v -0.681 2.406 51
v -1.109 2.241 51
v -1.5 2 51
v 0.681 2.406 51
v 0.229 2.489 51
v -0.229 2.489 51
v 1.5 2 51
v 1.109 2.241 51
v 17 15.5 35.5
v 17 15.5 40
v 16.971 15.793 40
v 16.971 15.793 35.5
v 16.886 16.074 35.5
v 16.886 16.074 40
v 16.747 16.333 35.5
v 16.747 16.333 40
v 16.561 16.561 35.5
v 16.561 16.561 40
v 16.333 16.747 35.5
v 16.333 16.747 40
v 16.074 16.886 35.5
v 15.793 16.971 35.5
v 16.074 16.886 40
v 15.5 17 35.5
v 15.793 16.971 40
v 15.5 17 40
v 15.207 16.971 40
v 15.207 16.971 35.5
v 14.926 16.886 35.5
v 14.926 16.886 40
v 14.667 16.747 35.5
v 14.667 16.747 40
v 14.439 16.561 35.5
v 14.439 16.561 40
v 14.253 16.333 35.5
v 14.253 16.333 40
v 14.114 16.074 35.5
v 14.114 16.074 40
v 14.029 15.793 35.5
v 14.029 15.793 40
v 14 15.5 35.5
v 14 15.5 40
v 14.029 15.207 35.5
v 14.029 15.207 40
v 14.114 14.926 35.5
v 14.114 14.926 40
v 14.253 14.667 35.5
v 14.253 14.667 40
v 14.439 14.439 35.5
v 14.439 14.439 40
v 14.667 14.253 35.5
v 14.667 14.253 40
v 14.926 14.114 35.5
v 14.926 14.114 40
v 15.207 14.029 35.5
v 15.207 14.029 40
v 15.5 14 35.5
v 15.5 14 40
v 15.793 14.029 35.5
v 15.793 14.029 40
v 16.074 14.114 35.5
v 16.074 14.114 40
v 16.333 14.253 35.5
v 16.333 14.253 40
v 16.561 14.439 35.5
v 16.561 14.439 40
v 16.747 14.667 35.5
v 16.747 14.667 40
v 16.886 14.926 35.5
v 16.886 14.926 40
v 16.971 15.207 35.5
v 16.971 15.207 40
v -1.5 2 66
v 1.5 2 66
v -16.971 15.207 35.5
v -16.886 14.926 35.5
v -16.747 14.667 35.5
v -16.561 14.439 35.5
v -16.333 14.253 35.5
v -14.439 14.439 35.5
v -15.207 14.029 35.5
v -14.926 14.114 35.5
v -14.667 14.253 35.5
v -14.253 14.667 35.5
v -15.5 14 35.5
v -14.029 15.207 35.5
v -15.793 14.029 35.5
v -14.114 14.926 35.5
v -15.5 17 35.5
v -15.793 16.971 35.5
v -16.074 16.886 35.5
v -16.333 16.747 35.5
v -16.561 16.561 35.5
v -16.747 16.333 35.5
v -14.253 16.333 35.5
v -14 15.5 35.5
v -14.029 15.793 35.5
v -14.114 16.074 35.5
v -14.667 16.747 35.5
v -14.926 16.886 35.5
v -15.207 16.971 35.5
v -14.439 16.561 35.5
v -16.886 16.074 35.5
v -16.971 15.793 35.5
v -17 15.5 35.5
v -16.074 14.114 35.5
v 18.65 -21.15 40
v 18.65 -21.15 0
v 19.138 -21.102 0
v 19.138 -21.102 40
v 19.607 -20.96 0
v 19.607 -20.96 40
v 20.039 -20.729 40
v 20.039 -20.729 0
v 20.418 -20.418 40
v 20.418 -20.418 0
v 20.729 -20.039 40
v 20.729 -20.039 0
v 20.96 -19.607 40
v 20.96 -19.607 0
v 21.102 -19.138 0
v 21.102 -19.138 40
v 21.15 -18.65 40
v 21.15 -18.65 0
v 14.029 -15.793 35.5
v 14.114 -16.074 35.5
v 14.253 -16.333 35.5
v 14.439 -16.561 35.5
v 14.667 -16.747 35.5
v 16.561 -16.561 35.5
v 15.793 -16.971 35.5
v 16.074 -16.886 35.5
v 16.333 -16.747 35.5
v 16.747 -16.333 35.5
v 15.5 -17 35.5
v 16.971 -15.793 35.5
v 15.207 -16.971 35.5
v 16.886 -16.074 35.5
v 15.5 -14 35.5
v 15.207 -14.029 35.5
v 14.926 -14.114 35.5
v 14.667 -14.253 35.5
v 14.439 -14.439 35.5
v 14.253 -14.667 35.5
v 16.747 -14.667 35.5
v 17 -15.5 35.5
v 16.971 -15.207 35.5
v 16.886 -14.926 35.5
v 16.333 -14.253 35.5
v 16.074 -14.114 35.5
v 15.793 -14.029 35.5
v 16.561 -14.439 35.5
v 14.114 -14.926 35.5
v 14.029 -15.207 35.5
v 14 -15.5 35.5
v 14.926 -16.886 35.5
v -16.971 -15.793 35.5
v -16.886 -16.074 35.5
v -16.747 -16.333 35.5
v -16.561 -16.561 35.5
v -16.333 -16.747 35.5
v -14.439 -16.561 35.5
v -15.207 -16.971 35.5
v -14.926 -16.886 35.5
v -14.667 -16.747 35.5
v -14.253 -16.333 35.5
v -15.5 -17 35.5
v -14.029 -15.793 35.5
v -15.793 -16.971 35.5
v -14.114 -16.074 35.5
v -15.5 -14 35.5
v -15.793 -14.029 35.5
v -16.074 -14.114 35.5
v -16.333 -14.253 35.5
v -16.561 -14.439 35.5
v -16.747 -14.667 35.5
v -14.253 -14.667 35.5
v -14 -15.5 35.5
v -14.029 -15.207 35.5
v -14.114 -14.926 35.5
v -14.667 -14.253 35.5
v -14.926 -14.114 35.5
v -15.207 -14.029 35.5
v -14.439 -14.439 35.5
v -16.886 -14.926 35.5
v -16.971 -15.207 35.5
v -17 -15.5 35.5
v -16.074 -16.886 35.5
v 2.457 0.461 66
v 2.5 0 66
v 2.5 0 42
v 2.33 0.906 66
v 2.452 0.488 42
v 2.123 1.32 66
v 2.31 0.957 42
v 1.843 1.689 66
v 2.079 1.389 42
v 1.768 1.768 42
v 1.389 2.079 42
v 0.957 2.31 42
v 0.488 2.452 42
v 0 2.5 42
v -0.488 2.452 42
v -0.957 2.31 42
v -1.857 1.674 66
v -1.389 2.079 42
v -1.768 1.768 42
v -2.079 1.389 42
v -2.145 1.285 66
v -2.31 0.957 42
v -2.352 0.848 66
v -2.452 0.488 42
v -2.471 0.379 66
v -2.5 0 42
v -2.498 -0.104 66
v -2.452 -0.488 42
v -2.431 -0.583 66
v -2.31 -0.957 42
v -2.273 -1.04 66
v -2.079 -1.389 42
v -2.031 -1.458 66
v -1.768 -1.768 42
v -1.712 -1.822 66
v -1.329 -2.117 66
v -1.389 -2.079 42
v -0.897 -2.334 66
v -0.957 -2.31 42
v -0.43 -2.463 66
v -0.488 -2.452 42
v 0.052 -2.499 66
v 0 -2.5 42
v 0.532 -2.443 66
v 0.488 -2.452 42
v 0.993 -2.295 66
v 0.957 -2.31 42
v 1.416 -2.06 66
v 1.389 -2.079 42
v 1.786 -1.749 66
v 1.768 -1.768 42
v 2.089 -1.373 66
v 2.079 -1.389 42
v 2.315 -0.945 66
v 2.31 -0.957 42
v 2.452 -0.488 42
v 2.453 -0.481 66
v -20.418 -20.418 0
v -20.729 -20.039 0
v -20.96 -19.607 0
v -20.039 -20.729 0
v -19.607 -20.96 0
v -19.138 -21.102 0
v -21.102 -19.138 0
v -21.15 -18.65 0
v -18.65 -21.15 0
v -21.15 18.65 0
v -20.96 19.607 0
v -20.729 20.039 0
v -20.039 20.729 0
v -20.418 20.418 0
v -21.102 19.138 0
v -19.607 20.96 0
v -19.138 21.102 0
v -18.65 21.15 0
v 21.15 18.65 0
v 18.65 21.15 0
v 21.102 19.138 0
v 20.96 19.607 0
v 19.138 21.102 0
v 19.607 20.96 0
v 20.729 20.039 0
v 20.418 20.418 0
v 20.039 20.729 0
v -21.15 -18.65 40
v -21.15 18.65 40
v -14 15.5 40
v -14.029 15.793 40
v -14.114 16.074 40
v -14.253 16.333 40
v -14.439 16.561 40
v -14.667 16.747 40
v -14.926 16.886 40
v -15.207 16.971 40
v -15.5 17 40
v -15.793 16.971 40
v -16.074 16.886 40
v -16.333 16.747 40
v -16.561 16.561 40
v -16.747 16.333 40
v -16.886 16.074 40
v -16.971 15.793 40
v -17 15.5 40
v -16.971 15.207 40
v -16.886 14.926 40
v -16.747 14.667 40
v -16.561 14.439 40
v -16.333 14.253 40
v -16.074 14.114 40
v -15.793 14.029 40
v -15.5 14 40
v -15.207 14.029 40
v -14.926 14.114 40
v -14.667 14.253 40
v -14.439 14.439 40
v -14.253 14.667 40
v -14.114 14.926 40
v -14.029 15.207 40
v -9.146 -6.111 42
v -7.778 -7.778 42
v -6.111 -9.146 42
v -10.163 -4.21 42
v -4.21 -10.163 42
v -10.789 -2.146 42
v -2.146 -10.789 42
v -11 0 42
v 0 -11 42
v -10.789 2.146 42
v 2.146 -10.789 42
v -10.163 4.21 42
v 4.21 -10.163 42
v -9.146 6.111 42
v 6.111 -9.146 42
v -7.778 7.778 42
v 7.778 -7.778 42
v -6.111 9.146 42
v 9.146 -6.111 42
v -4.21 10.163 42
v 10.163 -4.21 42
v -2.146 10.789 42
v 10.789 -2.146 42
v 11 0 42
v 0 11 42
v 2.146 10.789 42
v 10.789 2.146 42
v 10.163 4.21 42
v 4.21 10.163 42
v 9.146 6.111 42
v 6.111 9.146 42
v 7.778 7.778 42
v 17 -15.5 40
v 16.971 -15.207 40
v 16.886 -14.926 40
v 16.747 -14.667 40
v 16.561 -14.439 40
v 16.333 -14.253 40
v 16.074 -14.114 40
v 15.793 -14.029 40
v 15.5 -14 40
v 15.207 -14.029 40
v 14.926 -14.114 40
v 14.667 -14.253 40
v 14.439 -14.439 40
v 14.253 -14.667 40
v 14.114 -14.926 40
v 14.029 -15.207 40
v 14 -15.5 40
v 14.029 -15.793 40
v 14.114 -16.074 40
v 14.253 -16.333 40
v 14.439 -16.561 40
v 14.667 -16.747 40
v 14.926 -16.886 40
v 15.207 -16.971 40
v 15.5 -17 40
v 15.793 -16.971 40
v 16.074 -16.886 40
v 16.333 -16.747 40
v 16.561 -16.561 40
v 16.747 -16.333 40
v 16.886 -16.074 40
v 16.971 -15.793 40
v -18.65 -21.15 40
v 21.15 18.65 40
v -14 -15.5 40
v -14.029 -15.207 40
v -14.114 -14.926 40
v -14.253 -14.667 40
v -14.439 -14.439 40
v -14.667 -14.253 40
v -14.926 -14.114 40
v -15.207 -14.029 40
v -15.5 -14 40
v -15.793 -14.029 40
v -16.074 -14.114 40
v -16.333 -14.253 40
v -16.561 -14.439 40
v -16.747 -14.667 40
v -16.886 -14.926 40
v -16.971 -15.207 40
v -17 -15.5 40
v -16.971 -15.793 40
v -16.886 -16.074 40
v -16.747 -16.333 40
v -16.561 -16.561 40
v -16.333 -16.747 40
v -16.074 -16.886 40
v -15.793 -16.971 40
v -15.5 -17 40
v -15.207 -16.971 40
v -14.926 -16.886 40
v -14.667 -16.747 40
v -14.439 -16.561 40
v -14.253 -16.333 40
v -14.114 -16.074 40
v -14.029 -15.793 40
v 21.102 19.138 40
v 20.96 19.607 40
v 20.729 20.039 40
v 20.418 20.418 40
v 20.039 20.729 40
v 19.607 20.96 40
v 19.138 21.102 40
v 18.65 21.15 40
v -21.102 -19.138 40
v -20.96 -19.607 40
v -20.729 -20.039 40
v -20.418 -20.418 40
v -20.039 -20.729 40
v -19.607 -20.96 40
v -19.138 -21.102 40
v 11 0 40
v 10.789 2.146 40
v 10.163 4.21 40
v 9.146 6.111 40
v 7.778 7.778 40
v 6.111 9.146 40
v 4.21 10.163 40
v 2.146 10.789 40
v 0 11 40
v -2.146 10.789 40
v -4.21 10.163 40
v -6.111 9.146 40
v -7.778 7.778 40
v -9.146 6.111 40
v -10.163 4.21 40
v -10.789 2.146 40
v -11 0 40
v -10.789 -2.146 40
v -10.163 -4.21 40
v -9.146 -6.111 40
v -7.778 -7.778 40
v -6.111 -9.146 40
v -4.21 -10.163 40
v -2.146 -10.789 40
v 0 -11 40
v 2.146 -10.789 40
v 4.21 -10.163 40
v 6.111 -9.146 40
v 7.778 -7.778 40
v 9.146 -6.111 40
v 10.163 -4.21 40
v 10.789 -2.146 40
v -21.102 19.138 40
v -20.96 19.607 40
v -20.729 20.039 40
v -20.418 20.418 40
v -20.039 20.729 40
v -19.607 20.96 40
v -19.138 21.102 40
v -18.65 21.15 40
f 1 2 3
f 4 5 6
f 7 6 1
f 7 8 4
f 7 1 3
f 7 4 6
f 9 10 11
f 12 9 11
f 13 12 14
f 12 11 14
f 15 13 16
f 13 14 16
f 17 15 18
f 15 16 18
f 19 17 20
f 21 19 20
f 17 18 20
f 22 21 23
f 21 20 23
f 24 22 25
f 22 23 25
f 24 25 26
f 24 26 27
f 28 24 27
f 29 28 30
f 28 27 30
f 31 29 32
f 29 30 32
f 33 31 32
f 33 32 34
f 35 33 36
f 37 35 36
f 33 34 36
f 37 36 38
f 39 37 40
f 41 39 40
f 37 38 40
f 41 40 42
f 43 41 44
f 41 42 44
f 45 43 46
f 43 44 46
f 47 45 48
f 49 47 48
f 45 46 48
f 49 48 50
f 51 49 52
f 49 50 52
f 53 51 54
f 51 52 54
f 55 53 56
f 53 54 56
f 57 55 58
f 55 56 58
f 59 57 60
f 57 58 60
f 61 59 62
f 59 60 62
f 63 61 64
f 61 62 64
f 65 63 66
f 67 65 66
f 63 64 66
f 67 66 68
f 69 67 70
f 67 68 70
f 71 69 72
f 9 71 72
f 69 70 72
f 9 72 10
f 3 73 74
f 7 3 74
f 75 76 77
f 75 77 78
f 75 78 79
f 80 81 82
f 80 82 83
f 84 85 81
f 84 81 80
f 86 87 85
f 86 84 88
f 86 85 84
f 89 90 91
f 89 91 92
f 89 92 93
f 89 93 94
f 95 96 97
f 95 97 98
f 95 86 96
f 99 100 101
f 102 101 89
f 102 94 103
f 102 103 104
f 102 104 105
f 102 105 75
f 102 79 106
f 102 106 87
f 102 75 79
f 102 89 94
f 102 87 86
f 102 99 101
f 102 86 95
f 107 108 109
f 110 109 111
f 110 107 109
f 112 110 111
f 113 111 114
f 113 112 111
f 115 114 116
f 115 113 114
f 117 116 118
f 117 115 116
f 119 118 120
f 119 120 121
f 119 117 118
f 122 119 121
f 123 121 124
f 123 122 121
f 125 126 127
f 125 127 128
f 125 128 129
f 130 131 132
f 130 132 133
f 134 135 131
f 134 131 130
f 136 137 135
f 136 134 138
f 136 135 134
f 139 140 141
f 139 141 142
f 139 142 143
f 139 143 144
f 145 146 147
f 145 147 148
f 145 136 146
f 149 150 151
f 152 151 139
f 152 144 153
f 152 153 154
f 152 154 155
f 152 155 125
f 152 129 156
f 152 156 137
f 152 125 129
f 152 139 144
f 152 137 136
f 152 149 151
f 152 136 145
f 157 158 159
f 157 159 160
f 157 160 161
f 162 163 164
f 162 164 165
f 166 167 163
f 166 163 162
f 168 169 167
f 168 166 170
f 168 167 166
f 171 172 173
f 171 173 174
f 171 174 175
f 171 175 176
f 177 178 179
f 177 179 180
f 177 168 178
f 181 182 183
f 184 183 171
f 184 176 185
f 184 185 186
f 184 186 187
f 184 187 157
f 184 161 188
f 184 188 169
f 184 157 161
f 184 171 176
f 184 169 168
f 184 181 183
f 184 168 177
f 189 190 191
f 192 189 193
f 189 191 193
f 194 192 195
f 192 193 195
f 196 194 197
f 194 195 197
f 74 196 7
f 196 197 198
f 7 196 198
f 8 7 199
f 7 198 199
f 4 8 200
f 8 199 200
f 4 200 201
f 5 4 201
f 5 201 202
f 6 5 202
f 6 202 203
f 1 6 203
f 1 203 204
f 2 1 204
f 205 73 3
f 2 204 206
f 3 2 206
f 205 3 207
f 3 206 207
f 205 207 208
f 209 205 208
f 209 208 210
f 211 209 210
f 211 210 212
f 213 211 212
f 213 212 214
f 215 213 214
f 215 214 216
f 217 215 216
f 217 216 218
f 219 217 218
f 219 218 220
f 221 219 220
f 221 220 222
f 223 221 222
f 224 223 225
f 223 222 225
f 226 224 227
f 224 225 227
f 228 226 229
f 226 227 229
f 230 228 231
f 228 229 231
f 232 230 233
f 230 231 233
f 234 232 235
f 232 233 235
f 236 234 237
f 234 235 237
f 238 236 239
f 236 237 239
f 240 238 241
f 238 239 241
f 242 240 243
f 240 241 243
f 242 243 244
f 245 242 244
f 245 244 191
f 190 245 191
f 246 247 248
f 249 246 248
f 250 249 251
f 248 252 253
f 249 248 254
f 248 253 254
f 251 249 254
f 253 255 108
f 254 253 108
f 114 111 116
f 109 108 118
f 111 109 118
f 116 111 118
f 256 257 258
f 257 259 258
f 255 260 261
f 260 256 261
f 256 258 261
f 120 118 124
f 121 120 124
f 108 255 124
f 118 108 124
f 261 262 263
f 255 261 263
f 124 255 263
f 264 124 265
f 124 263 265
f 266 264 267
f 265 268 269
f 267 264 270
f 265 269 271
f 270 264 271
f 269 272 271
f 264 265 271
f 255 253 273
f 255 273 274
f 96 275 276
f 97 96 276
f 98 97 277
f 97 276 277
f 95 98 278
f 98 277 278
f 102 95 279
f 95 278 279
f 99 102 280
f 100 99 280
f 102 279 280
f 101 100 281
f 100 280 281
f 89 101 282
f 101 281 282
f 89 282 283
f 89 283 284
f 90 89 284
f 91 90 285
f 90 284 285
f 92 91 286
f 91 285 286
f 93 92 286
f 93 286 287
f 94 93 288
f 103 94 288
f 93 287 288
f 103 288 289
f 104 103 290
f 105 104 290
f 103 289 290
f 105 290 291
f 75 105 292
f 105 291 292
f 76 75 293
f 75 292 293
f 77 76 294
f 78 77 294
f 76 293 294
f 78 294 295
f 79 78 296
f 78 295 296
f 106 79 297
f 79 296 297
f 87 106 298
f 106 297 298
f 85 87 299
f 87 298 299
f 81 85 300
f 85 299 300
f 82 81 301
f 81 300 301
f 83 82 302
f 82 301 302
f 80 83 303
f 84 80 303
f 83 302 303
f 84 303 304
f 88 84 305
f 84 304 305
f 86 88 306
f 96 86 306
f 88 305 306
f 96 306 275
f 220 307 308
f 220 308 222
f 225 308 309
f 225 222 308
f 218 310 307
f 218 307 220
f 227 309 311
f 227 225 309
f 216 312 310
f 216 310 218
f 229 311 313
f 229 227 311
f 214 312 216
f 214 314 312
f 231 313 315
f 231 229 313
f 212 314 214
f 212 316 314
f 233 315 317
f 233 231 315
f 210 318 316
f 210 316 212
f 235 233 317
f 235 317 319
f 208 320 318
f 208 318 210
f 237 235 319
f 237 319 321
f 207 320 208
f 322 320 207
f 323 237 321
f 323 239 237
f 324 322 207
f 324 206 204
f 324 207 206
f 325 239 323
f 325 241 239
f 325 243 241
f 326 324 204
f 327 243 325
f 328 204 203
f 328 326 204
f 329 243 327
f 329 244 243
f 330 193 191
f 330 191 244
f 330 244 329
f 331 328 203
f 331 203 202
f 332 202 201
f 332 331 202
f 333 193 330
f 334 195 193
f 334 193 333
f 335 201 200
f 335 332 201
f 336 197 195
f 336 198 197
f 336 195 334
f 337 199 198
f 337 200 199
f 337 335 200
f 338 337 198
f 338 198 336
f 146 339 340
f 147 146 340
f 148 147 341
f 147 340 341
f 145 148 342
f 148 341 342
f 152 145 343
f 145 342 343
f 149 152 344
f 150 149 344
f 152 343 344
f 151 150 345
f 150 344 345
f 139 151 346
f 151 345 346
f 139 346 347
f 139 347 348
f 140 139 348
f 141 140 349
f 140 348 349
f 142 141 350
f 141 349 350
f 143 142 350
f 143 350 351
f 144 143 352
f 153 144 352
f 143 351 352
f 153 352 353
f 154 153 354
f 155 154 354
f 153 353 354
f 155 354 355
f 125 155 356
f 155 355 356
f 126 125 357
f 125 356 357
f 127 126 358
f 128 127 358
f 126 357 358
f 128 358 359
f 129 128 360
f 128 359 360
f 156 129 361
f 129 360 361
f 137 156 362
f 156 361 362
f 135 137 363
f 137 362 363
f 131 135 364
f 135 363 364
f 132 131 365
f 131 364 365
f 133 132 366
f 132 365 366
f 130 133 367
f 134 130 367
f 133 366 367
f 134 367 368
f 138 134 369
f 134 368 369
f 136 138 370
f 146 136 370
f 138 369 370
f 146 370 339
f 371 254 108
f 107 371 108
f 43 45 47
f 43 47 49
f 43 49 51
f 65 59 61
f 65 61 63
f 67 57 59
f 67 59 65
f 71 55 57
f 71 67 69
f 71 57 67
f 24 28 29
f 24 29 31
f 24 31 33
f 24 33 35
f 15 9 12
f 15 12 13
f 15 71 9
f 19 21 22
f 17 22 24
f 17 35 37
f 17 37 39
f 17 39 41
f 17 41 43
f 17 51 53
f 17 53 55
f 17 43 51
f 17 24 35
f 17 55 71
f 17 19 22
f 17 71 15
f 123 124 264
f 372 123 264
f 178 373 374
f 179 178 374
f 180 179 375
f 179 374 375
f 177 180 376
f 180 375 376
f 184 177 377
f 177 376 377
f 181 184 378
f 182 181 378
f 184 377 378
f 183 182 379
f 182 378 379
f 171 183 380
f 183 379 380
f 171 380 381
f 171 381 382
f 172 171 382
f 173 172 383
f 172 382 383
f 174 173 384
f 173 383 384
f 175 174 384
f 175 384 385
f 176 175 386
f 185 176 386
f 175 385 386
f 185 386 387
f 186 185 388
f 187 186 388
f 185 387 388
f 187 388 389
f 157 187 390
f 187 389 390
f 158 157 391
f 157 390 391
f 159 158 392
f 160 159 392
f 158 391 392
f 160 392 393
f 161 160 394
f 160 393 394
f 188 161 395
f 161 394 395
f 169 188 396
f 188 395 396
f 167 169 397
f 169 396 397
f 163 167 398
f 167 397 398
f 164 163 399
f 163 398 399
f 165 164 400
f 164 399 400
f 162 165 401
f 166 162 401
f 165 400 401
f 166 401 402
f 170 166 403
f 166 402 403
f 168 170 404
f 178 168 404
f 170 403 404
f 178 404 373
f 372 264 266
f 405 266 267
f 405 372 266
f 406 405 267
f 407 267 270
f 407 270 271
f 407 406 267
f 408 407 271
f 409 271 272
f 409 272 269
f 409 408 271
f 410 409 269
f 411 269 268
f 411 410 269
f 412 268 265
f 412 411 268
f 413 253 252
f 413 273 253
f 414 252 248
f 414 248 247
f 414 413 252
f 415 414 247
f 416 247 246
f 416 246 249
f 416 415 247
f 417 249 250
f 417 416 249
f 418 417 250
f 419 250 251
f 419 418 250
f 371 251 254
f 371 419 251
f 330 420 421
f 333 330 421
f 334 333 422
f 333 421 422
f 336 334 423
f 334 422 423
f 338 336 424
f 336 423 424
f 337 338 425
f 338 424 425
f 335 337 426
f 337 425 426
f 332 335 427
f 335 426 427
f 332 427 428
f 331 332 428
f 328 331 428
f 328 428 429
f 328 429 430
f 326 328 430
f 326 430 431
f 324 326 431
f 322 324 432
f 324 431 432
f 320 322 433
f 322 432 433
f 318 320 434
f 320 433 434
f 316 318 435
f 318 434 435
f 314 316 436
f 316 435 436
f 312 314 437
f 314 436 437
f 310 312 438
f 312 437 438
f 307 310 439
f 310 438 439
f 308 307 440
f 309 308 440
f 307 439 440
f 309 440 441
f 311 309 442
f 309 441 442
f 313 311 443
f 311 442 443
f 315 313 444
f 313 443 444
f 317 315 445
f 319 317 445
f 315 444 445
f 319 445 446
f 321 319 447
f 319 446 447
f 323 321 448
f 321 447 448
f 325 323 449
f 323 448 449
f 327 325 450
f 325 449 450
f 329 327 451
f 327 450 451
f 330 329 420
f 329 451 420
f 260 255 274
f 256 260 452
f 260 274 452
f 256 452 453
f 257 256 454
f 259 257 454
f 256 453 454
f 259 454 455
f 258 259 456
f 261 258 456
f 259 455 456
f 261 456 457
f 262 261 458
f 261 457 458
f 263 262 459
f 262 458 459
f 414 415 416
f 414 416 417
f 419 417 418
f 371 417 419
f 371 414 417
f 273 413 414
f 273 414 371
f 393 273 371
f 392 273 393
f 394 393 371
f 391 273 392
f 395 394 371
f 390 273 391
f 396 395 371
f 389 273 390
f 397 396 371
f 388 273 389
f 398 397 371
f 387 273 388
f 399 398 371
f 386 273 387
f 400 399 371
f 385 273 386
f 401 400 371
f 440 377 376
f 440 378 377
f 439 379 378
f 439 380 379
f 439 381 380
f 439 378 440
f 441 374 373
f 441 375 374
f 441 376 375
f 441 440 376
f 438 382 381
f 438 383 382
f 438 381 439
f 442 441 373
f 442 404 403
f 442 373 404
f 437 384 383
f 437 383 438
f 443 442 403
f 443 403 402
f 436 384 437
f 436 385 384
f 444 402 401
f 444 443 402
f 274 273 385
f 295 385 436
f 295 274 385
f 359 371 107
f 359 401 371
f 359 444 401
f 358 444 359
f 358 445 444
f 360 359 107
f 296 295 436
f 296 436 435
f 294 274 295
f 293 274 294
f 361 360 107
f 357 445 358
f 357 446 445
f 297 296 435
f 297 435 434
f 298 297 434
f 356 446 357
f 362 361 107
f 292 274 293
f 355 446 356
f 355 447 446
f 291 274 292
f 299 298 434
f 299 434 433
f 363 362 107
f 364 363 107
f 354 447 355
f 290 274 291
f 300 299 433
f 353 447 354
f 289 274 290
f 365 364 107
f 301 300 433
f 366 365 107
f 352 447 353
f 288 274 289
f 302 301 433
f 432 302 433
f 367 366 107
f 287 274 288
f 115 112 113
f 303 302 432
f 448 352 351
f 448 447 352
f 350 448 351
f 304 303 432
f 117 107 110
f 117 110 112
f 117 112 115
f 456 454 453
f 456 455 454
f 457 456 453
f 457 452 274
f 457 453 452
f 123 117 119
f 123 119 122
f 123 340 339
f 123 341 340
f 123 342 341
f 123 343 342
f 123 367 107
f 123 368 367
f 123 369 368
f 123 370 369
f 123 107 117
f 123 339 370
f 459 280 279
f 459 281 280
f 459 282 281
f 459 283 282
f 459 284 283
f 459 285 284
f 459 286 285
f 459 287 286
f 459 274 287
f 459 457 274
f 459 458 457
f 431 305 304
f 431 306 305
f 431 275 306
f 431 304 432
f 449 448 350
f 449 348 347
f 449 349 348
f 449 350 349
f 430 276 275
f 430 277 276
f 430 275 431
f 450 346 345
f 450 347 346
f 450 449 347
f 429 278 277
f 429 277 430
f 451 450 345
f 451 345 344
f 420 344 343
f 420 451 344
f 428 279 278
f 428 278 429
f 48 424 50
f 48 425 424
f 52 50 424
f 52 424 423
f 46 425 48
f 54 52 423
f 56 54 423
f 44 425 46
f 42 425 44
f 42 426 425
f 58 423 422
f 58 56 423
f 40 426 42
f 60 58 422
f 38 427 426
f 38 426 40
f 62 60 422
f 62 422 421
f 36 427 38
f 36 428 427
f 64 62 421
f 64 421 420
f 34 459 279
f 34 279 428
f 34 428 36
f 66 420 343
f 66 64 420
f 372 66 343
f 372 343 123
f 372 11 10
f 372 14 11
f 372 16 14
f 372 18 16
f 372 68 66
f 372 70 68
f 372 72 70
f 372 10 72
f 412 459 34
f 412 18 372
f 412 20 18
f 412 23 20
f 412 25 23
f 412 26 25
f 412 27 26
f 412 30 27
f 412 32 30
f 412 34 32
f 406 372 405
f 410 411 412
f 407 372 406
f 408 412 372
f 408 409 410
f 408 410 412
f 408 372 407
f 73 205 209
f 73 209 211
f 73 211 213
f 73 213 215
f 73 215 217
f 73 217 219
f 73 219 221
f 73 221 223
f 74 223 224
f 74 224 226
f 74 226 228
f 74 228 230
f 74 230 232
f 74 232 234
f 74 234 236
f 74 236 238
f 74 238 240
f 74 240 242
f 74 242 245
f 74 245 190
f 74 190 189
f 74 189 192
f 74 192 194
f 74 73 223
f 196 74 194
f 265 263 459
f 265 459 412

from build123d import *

# Parameters (mm, degrees)
ESBO_O1_W                = 42.3
ESBO_O1_H                = 42.3
RESSALTO_EXTRUS_O1_DEPTH = 40
FILETE1_R                = 2.5
ESBO_O2_R                = 1.5
CORTE_EXTRUS_O2_DEPTH    = 4.5
ESBO_O3_R                = 11
RESSALTO_EXTRUS_O2_DEPTH = 2
ESBO_O4_R                = 2.5
RESSALTO_EXTRUS_O3_DEPTH = 24
ESBO_O5_W                = 8
ESBO_O5_H                = 1
CORTE_EXTRUS_O3_DEPTH    = 15


with BuildPart() as part:
    # Esboço1 → Ressalto-extrusão1 (new body)
    with BuildSketch(Plane.XY):
        Rectangle(ESBO_O1_W, ESBO_O1_H)
    extrude(amount=RESSALTO_EXTRUS_O1_DEPTH)

    # Filete1
    filete1_edges = [part.edges().sort_by_distance(p)[0] for p in [
        (-21.15, 21.15, 20),
        (21.15, 21.15, 20),
        (21.15, -21.15, 20),
        (-21.15, -21.15, 20),
    ]]
    fillet(filete1_edges, radius=FILETE1_R)

    # Esboço2 → Corte-extrusão2 (cut)
    with BuildSketch(Plane.XY.offset(40)):
        with Locations((-15.5, 15.5)):
            Circle(ESBO_O2_R)
        with Locations((15.5, 15.5)):
            Circle(ESBO_O2_R)
        with Locations((15.5, -15.5)):
            Circle(ESBO_O2_R)
        with Locations((-15.5, -15.5)):
            Circle(ESBO_O2_R)
    extrude(amount=-CORTE_EXTRUS_O2_DEPTH, mode=Mode.SUBTRACT)

    # Esboço3 → Ressalto-extrusão2 (add)
    with BuildSketch(Plane.XY.offset(40)):
        Circle(ESBO_O3_R)
    extrude(amount=RESSALTO_EXTRUS_O2_DEPTH)

    # Esboço4 → Ressalto-extrusão3 (add)
    with BuildSketch(Plane.XY.offset(42)):
        Circle(ESBO_O4_R)
    extrude(amount=RESSALTO_EXTRUS_O3_DEPTH)

    # Esboço5 → Corte-extrusão3 (cut)
    with BuildSketch(Plane.XY.offset(66)):
        with Locations((0, 2.5)):
            Rectangle(ESBO_O5_W, ESBO_O5_H)
    extrude(amount=-CORTE_EXTRUS_O3_DEPTH, mode=Mode.SUBTRACT)


solid = part.part
